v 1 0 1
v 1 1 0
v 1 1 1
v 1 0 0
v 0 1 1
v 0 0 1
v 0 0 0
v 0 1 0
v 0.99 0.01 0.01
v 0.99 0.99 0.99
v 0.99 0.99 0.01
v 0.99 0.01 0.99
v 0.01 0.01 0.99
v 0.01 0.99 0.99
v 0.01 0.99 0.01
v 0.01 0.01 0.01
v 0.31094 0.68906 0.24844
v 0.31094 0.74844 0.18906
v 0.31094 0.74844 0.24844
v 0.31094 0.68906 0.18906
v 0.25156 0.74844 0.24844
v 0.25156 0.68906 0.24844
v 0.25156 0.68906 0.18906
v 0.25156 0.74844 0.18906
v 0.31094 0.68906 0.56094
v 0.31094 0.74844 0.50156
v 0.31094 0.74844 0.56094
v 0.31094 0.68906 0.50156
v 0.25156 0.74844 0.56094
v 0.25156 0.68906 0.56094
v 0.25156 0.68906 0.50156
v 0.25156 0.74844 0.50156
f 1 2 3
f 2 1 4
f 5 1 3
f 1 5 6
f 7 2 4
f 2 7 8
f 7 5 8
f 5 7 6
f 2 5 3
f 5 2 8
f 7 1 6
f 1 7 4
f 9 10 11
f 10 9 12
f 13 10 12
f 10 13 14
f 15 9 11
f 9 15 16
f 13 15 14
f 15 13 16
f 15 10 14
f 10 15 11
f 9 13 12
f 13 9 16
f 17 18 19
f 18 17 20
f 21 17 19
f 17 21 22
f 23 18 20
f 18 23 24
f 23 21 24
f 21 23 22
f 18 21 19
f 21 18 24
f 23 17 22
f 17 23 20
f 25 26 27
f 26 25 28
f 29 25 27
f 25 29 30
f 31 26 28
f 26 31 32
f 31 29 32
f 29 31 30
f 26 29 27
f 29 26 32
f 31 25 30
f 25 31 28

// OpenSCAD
translate([0.28125, 0.71875, 0.21875]) color([0.36270118963089737, 0.5138414630226216, 0.14357255994509865]) cube([0.059375, 0.059375, 0.059375], center=true);
translate([0.28125, 0.71875, 0.53125]) color([0.466624584989368, 0.29734697142143796, 0.9844700368526675]) cube([0.059375, 0.059375, 0.059375], center=true);
color([0.3,0.3,0.3,0.3]) difference() { cube([1,1,1]); translate([0.01,0.01,0.01]) cube([0.98,0.98,0.98]); }
